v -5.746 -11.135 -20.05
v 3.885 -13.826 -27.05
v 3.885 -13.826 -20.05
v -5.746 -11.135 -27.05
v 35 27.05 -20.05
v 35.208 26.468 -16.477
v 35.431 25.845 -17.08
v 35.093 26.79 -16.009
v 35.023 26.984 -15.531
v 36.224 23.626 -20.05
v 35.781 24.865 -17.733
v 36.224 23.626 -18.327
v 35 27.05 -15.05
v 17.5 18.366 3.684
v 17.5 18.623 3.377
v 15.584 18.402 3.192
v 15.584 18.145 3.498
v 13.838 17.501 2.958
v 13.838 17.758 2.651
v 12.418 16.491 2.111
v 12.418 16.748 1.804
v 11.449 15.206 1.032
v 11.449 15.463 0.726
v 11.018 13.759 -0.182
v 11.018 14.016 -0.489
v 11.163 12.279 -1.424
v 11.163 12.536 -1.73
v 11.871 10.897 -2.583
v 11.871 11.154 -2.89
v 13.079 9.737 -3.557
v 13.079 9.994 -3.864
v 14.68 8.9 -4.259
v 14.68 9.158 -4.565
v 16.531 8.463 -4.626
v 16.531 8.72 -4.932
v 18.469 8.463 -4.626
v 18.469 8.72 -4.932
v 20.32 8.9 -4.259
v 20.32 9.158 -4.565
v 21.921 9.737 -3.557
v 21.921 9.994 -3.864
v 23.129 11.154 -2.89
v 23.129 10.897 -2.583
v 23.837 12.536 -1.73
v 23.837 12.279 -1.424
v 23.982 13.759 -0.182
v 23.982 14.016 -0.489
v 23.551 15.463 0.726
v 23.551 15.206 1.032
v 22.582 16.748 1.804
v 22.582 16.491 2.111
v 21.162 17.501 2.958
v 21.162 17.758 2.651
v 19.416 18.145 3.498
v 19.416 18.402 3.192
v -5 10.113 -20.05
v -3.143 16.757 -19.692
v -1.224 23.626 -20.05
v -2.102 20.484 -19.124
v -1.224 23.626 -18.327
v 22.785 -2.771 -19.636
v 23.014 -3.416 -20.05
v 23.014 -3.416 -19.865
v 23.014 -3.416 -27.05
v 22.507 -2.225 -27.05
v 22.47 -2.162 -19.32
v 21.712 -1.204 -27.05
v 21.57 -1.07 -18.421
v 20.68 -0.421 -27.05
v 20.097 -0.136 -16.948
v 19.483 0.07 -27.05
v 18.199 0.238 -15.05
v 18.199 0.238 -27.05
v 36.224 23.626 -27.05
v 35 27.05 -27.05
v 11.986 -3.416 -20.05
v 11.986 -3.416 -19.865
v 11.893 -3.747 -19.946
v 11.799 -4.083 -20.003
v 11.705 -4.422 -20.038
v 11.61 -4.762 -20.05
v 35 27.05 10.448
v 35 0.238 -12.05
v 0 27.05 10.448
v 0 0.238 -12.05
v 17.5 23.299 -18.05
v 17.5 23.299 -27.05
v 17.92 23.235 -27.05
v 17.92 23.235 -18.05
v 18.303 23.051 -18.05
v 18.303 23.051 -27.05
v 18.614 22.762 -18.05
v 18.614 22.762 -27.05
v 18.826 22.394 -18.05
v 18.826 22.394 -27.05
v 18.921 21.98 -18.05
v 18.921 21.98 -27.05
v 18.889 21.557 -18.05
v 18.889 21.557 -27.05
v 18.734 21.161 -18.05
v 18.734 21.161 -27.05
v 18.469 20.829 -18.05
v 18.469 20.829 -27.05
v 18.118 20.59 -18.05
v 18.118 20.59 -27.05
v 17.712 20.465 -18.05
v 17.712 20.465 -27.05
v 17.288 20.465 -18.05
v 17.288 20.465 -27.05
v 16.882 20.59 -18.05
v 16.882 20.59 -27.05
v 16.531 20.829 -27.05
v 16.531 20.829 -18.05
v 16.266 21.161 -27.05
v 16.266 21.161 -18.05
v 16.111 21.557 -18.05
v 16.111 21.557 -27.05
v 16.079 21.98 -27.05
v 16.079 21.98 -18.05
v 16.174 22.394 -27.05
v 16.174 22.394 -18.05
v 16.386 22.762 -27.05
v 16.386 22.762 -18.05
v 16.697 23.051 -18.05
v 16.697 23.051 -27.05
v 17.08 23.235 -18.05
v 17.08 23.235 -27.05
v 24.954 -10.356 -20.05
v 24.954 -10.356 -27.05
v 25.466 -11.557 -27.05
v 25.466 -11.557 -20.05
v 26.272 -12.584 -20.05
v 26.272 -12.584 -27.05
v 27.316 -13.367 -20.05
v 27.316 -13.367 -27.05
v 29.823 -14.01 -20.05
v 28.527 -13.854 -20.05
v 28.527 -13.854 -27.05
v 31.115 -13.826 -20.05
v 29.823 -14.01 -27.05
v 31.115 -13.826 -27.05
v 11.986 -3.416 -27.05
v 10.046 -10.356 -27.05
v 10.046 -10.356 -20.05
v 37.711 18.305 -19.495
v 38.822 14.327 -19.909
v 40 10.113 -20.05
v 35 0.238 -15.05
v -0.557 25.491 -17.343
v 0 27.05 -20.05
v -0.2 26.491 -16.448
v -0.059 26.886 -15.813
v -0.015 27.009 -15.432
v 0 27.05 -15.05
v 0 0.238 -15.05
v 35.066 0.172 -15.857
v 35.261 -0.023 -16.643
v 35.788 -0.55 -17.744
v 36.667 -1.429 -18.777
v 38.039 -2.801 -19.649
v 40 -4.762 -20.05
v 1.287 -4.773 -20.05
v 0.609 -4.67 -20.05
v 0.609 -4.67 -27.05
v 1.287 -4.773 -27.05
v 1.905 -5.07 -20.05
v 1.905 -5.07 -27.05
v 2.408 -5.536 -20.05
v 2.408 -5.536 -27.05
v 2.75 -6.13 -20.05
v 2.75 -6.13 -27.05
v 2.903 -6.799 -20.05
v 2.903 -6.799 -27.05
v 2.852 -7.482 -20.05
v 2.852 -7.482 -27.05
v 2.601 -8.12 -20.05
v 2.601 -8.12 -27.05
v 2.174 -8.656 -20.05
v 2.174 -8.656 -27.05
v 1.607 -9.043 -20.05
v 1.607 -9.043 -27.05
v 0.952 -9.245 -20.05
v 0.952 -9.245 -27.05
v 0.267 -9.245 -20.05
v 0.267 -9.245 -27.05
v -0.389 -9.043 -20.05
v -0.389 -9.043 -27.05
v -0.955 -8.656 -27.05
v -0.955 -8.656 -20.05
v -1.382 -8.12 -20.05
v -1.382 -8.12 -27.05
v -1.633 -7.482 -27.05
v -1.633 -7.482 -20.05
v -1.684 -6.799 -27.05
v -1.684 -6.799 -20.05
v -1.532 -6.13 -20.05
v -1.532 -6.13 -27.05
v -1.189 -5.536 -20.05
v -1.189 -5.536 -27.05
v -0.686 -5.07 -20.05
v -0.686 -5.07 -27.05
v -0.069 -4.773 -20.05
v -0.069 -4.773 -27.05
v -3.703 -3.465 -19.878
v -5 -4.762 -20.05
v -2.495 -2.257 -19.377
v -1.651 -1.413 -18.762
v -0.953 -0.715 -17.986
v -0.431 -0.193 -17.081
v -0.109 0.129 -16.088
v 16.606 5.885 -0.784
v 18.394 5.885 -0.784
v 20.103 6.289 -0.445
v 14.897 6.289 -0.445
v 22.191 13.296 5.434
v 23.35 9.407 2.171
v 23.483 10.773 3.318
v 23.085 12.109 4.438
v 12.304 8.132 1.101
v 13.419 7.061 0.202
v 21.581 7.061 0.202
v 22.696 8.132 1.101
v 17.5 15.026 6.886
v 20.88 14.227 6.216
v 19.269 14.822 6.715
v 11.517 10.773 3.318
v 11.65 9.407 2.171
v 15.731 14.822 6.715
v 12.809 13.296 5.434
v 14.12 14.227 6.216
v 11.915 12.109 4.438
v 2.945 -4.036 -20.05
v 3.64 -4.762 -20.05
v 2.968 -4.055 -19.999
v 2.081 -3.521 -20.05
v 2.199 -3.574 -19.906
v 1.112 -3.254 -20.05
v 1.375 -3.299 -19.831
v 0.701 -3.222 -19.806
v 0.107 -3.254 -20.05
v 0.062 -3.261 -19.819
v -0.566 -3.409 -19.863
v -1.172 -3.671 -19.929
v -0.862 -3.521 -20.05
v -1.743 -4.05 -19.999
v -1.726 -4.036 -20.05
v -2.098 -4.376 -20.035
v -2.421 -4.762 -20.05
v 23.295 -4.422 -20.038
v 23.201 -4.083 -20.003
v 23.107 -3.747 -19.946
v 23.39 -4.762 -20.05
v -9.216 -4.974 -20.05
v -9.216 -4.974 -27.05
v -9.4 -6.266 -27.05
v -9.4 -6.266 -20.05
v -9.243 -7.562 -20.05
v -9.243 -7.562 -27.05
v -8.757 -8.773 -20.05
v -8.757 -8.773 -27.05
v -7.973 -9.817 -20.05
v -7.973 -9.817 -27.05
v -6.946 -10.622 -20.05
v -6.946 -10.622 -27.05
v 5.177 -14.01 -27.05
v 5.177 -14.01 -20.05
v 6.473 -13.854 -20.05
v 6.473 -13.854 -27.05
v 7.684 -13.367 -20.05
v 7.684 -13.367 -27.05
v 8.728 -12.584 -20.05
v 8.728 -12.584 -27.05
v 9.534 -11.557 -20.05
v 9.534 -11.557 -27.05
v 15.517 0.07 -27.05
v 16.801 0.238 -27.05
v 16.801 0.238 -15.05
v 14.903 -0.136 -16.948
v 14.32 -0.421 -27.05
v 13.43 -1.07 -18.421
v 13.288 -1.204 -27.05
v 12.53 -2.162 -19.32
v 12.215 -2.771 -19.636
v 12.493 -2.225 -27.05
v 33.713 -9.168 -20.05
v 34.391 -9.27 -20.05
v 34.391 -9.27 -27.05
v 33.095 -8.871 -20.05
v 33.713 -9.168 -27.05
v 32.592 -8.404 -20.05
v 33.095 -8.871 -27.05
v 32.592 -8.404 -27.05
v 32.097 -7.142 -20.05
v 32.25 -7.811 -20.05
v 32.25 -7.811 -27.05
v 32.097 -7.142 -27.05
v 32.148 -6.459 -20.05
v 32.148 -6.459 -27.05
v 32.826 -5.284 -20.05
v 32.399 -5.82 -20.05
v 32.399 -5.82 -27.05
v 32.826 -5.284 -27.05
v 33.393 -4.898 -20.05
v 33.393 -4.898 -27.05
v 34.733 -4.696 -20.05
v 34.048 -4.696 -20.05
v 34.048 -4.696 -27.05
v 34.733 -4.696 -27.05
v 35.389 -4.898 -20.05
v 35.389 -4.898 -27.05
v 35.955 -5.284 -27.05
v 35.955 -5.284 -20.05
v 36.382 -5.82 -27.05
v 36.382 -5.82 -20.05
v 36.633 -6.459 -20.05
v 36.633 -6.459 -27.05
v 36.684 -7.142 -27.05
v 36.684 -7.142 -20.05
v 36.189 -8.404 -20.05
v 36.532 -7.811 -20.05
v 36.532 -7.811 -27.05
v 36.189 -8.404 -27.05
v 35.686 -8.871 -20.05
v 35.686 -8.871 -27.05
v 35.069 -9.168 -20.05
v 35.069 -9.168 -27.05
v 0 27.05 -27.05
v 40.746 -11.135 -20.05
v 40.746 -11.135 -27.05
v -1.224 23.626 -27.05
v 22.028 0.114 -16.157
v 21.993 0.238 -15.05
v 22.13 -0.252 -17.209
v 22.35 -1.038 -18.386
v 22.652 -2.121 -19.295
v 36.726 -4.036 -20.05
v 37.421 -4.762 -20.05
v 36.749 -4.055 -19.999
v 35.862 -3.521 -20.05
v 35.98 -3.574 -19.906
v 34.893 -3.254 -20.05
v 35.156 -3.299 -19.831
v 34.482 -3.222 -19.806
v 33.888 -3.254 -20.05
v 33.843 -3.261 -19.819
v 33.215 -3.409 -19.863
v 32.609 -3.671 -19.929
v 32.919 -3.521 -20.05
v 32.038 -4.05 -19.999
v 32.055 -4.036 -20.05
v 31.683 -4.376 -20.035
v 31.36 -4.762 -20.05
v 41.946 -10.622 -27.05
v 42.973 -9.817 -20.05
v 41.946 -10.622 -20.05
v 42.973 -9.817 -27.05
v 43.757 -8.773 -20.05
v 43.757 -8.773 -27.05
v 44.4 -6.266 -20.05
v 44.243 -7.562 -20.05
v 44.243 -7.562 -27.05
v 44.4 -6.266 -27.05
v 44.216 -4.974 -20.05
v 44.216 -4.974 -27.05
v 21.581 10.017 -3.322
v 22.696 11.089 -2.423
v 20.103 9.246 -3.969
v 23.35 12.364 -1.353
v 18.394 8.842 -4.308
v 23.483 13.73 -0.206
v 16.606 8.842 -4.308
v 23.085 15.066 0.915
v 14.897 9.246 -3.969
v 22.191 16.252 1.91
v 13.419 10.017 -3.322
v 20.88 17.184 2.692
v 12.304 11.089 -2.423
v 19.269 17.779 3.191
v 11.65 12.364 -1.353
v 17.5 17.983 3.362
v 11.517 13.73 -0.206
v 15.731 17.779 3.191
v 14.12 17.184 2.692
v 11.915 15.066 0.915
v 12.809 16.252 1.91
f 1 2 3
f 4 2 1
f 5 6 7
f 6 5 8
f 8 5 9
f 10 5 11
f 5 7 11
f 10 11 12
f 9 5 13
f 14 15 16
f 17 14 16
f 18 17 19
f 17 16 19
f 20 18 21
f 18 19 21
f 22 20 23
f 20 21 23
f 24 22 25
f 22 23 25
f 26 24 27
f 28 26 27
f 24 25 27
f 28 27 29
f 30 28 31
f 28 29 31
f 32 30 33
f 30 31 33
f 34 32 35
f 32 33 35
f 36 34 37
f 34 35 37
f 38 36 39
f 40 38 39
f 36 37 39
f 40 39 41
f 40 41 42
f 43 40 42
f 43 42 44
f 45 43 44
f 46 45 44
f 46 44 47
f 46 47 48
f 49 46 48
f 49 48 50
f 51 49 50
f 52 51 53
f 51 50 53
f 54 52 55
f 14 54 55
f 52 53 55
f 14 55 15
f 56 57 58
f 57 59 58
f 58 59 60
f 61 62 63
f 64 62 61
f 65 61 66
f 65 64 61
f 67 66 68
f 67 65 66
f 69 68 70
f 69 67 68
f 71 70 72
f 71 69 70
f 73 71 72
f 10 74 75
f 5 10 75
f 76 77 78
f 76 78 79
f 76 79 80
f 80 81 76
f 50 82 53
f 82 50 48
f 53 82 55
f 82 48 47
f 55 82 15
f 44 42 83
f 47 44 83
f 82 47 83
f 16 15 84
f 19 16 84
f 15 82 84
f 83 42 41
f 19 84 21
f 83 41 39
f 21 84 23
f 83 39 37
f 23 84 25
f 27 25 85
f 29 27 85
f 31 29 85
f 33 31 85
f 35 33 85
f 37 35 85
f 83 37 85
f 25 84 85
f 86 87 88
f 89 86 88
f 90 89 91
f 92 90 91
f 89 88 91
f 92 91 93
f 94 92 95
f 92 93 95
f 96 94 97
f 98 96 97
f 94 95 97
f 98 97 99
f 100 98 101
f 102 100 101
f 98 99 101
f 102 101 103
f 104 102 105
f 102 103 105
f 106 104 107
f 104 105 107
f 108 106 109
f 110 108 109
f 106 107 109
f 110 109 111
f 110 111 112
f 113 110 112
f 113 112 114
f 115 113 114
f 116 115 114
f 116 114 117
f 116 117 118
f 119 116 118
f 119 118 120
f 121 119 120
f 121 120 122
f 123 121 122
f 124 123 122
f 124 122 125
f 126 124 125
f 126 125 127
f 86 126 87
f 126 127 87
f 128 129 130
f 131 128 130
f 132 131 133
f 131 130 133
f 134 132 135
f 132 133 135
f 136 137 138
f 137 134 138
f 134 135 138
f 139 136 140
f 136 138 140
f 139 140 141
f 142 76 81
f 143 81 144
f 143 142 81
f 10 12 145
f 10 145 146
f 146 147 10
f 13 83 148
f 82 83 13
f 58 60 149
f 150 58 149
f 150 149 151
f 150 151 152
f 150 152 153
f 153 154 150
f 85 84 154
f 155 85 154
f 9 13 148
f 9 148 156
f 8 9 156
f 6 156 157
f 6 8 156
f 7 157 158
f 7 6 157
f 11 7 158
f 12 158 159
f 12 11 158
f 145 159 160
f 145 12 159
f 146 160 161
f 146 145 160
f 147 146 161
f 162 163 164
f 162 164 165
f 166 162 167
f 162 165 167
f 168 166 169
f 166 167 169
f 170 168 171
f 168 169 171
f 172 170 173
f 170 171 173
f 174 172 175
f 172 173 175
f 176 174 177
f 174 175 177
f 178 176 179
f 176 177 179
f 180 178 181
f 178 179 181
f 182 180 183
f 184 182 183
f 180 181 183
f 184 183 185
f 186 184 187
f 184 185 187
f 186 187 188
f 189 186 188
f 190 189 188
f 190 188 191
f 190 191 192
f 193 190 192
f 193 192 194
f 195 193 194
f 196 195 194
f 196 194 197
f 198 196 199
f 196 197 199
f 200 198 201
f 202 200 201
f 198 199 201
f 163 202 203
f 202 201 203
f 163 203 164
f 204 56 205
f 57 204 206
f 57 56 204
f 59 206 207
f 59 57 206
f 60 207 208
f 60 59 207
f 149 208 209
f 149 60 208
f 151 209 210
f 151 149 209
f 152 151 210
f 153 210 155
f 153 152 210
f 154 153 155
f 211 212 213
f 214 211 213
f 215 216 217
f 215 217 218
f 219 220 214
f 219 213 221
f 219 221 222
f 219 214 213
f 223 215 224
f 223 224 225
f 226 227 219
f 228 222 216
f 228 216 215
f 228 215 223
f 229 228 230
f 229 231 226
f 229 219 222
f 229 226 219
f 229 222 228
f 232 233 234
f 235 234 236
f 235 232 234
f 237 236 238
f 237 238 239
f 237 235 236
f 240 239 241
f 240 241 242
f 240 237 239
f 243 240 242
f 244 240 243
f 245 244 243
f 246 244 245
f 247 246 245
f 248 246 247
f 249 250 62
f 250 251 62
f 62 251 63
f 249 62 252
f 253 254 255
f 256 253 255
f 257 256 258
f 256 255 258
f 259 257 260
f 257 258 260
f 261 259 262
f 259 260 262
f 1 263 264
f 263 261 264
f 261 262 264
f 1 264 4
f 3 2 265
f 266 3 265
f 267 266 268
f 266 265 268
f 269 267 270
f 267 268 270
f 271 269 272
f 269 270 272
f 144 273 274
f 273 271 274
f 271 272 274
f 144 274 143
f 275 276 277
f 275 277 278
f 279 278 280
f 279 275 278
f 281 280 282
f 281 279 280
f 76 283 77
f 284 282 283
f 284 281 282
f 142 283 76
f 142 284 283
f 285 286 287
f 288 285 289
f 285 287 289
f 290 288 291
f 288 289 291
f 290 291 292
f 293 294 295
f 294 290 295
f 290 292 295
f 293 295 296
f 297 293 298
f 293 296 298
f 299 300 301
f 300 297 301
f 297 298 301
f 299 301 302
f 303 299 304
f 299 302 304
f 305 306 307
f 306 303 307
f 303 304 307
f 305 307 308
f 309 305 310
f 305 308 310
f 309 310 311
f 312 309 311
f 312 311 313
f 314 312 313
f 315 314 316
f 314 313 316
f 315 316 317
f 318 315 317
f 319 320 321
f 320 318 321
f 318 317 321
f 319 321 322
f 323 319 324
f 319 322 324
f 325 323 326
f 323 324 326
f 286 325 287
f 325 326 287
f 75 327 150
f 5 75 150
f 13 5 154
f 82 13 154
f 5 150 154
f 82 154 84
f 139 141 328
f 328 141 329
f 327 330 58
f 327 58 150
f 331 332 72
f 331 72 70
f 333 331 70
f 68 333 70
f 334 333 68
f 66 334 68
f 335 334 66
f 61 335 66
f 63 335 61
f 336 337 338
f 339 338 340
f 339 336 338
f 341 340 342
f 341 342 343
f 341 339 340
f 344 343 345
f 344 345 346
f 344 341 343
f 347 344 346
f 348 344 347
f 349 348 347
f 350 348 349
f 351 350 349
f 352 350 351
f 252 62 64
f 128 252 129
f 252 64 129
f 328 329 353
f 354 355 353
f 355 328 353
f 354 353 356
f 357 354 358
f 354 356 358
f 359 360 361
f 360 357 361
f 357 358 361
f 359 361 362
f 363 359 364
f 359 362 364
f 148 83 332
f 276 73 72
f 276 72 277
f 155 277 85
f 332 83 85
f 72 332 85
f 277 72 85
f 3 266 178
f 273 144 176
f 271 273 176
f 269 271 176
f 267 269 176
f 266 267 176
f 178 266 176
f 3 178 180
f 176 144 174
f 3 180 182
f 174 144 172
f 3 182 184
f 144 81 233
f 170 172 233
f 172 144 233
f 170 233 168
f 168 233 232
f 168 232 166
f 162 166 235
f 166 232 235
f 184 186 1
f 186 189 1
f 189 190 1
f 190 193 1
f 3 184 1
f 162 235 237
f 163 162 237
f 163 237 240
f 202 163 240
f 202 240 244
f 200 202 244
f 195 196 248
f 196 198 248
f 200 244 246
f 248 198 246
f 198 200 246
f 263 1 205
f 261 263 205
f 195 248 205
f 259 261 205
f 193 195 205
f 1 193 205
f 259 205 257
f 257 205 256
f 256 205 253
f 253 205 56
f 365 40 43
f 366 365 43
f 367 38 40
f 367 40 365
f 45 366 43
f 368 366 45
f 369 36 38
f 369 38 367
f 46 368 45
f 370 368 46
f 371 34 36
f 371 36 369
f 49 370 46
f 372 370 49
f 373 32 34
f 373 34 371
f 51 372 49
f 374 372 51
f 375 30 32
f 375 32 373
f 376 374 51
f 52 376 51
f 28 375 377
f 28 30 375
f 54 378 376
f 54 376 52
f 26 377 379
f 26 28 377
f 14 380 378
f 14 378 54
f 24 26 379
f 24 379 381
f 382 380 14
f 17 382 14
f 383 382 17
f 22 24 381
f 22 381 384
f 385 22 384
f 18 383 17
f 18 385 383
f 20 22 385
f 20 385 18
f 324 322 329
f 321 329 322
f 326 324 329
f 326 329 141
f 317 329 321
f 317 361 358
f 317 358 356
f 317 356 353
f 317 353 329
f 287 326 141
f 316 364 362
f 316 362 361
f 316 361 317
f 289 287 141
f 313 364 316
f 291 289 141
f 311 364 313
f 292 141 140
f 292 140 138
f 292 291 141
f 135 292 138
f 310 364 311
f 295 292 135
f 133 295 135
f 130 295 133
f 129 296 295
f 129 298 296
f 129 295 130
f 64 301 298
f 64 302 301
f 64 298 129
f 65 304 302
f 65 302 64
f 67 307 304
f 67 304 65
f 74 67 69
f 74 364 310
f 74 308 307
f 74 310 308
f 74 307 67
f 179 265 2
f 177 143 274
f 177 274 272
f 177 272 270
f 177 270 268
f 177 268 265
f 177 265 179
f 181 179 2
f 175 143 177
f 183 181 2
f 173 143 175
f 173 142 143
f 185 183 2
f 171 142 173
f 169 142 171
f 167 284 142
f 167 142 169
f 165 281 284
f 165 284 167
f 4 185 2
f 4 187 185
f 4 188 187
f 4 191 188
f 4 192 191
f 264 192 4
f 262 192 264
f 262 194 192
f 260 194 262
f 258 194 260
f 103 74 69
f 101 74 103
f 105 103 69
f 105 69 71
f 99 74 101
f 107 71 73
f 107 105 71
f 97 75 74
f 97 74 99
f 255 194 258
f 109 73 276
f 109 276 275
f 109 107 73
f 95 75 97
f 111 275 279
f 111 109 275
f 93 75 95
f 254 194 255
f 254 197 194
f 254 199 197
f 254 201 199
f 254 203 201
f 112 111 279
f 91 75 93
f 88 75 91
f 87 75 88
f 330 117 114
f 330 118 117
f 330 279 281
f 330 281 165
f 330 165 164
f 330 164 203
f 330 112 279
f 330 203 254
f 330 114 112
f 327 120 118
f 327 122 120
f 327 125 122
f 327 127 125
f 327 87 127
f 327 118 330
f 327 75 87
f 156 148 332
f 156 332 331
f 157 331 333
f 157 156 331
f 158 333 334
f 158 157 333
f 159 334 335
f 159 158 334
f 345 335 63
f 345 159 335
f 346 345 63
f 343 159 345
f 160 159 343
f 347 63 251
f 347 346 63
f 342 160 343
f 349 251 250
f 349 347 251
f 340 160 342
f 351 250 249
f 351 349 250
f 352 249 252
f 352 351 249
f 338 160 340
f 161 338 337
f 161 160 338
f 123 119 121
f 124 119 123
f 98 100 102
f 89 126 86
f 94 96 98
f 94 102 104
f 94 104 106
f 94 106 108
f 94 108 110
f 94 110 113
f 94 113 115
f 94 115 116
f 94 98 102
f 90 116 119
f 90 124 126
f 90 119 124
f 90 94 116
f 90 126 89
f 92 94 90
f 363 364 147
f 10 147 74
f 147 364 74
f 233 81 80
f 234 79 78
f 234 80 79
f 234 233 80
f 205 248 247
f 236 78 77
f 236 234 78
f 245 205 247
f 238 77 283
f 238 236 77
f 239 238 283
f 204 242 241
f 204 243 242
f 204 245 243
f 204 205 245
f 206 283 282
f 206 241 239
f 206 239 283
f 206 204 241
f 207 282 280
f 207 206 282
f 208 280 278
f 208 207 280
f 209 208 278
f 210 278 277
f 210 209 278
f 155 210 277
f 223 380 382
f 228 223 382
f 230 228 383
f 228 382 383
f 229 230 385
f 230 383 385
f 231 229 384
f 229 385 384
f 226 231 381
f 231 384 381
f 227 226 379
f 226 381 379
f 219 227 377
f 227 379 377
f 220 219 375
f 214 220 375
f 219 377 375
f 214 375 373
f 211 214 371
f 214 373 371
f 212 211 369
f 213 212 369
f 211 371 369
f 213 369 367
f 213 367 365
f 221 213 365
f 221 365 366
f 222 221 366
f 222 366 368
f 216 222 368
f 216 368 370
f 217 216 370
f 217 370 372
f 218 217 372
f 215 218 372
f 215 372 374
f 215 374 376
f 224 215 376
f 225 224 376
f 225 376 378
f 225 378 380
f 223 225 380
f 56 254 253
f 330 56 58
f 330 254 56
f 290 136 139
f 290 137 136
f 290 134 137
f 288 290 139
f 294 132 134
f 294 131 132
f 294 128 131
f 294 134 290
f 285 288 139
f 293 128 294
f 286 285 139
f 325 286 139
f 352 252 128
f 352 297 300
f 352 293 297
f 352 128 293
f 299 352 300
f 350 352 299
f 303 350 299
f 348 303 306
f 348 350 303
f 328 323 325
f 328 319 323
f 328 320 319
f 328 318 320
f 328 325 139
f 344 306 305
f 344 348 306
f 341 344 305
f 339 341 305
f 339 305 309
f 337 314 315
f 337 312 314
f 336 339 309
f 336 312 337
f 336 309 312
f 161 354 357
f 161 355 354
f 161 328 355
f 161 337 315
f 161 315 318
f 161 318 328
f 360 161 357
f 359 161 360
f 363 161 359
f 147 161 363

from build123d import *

# Parameters (mm, degrees)
AUFSATZ_LINEAR_AUSTRAGEN1_DEPTH    = 35
SKIZZE3_R                          = 6
AUFSATZ_LINEAR_AUSTRAGEN2_DEPTH    = 5
SKIZZE4_R                          = 6.5
AUFSATZ_LINEAR_AUSTRAGEN3_DEPTH    = 0.4
K_RPER_VERSCHIEBEN_KOPIEREN1_ANGLE = 90
SKIZZE9_R                          = 2.3
AUFSATZ_LINEAR_AUSTRAGEN4_DEPTH    = 7
VERRUNDUNG1_R                      = 5
SKIZZE11_R                         = 3.75
SCHNITT_LINEAR_AUSTRAGEN2_DEPTH    = 10
SKIZZE12_R                         = 1.425000005
SCHNITT_LINEAR_AUSTRAGEN3_DEPTH    = 9


with BuildPart() as part:
    # Skizze1 → Aufsatz-Linear austragen1 (new body)
    with BuildSketch(Plane(origin=(0, 0, 0), x_dir=(0, 0, -1), z_dir=(1, 0, 0))):
        Polygon((0, 0), (26.811555509, 0), (26.811555509, 37.497566339), (0, 15), align=None)
    extrude(amount=AUFSATZ_LINEAR_AUSTRAGEN1_DEPTH)

    # Skizze3 → Aufsatz-Linear austragen2 (add)
    with BuildSketch(Plane(origin=(0, 8.802361333, 7.386058148), x_dir=(1, 0, 0), z_dir=(0, 0.7660444431189768, 0.642787609686541))):
        with Locations(Location((17.5, 27.141814145, 0), (0, 0, 90))):
            Circle(SKIZZE3_R)
    extrude(amount=AUFSATZ_LINEAR_AUSTRAGEN2_DEPTH)

    # Skizze4 → Aufsatz-Linear austragen3 (add)
    with BuildSketch(Plane(origin=(0, 8.802361333, 7.386058148), x_dir=(1, 0, 0), z_dir=(0, 0.7660444431189767, 0.6427876096865409))):
        with Locations(Location((17.5, 27.141814145, 0), (0, 0, 90))):
            Circle(SKIZZE4_R)
    extrude(amount=AUFSATZ_LINEAR_AUSTRAGEN3_DEPTH)


with BuildPart() as part_1:
    # Körper-Verschieben/Kopieren1: moved
    add(part.part.rotate(Axis((0, 13.64378317, -13.405777755), (1, 0, 0)), K_RPER_VERSCHIEBEN_KOPIEREN1_ANGLE))

    # Skizze9 → Aufsatz-Linear austragen4 (add)
    # profile 1 of 2: a face of its own
    with BuildSketch(Plane(origin=(0, 0, -27.049560924), x_dir=(-1, 0, 0), z_dir=(0, 0, -1))):
        Polygon((-13.006801175, 0.238005415), (-8.700779715, -15.171672686), (10.561317912, -9.789145862), (1.223844944, 23.626259531), (0, 27.049560924), (0, 0.238005415), align=None)
        with Locations(Location((-0.609417277, -6.970434083, 0), (0, 0, 90))):
            Circle(SKIZZE9_R, mode=Mode.SUBTRACT)
    # profile 2 of 2: a face of its own
    with BuildSketch(Plane(origin=(0, 0, -27.049560924), x_dir=(-1, 0, 0), z_dir=(0, 0, -1))):
        Polygon((-45.561317912, -9.789145862), (-36.223844944, 23.626259531), (-35, 27.049560924), (-35, 0.238005415), (-21.993198825, 0.238005415), (-26.299220285, -15.171672686), align=None)
        with Locations(Location((-34.390582723, -6.970434083, 0), (0, 0, 270))):
            Circle(SKIZZE9_R, mode=Mode.SUBTRACT)
    extrude(amount=-AUFSATZ_LINEAR_AUSTRAGEN4_DEPTH)

    # Verrundung1
    # the kernel refuses this fillet: 5 mm, written as the material it adds along each edge
    with BuildSketch(Plane(origin=(35, 27.049560924, -20.049560924), x_dir=(1, 0, 0), z_dir=(0, -1, 0))) as verrundung1_piece_1_section:
        with BuildLine():
            CenterArc((VERRUNDUNG1_R, VERRUNDUNG1_R), VERRUNDUNG1_R, 180, 90)
            Line((0, VERRUNDUNG1_R), (-VERRUNDUNG1_R * 0.02, VERRUNDUNG1_R))
            Line((-VERRUNDUNG1_R * 0.02, VERRUNDUNG1_R), (-VERRUNDUNG1_R * 0.02, -VERRUNDUNG1_R * 0.02))
            Line((-VERRUNDUNG1_R * 0.02, -VERRUNDUNG1_R * 0.02), (VERRUNDUNG1_R, -VERRUNDUNG1_R * 0.02))
            Line((VERRUNDUNG1_R, -VERRUNDUNG1_R * 0.02), (VERRUNDUNG1_R, 0))
        make_face()
    verrundung1_piece_1 = extrude(amount=26.811555509, mode=Mode.PRIVATE)
    verrundung1_piece_1 = split(verrundung1_piece_1, bisect_by=Plane(origin=(39.17481741, 13.065806869, -18.82374956), z_dir=(-0.9631048813334838, -0.2691263412444353, -1.6244750072279728e-13)), keep=Keep.TOP, mode=Mode.PRIVATE)
    verrundung1_piece_1 = split(verrundung1_piece_1, bisect_by=Plane(origin=(39.826476164, 13.549090416, -18.82374956), z_dir=(-0.9416340631335743, -0.3366382199729496, -2.0319838344143382e-13)), keep=Keep.TOP, mode=Mode.PRIVATE)
    add(verrundung1_piece_1)
    with BuildSketch(Plane(origin=(35, 0.238005415, -20.049560924), x_dir=(0, 0, 1), z_dir=(-1, 0, 0))) as verrundung1_piece_2_section:
        with BuildLine():
            CenterArc((VERRUNDUNG1_R, -VERRUNDUNG1_R), VERRUNDUNG1_R, 90, 90)
            Line((0, -VERRUNDUNG1_R), (-VERRUNDUNG1_R * 0.02, -VERRUNDUNG1_R))
            Line((-VERRUNDUNG1_R * 0.02, -VERRUNDUNG1_R), (-VERRUNDUNG1_R * 0.02, VERRUNDUNG1_R * 0.02))
            Line((-VERRUNDUNG1_R * 0.02, VERRUNDUNG1_R * 0.02), (VERRUNDUNG1_R, VERRUNDUNG1_R * 0.02))
            Line((VERRUNDUNG1_R, VERRUNDUNG1_R * 0.02), (VERRUNDUNG1_R, 0))
        make_face()
    verrundung1_piece_2 = extrude(amount=25.506801175, mode=Mode.PRIVATE)
    verrundung1_piece_2 = split(verrundung1_piece_2, bisect_by=Plane(origin=(22.762065147, -2.513486336, -18.902354356), z_dir=(0.9631048813334842, 0.2691263412444339, 1.6244750072279647e-13)), keep=Keep.TOP, mode=Mode.PRIVATE)
    verrundung1_piece_2 = verrundung1_piece_2 - Plane(origin=(34.390582723, -6.970434083, -18.902354356), x_dir=(0, -1, 0), z_dir=(0, 0, -1)) * Cylinder(2.3, 72, mode=Mode.PRIVATE)
    add(verrundung1_piece_2)
    with BuildSketch(Plane(origin=(35, 0.238005415, -20.049560924), x_dir=(0, 0, 1), z_dir=(-1, 0, 0))) as verrundung1_piece_3_section:
        with BuildLine():
            CenterArc((VERRUNDUNG1_R, -VERRUNDUNG1_R), VERRUNDUNG1_R, 90, 90)
            Line((0, -VERRUNDUNG1_R), (-VERRUNDUNG1_R * 0.02, -VERRUNDUNG1_R))
            Line((-VERRUNDUNG1_R * 0.02, -VERRUNDUNG1_R), (-VERRUNDUNG1_R * 0.02, VERRUNDUNG1_R * 0.02))
            Line((-VERRUNDUNG1_R * 0.02, VERRUNDUNG1_R * 0.02), (VERRUNDUNG1_R, VERRUNDUNG1_R * 0.02))
            Line((VERRUNDUNG1_R, VERRUNDUNG1_R * 0.02), (VERRUNDUNG1_R, 0))
        make_face()
    verrundung1_piece_3 = extrude(amount=25.506801175, mode=Mode.PRIVATE)
    verrundung1_piece_3 = split(verrundung1_piece_3, bisect_by=Plane(origin=(12.602046932, -1.210462189, -18.857593889), z_dir=(-0.9631048813334842, 0.26912634124443413, 1.6244750072279654e-13)), keep=Keep.TOP, mode=Mode.PRIVATE)
    add(verrundung1_piece_3)
    with BuildSketch(Plane(origin=(0, 0.238005415, -20.049560924), x_dir=(0, 0, 1), z_dir=(1, 0, 0))) as verrundung1_piece_4_section:
        with BuildLine():
            CenterArc((VERRUNDUNG1_R, VERRUNDUNG1_R), VERRUNDUNG1_R, 180, 90)
            Line((0, VERRUNDUNG1_R), (-VERRUNDUNG1_R * 0.02, VERRUNDUNG1_R))
            Line((-VERRUNDUNG1_R * 0.02, VERRUNDUNG1_R), (-VERRUNDUNG1_R * 0.02, -VERRUNDUNG1_R * 0.02))
            Line((-VERRUNDUNG1_R * 0.02, -VERRUNDUNG1_R * 0.02), (VERRUNDUNG1_R, -VERRUNDUNG1_R * 0.02))
            Line((VERRUNDUNG1_R, -VERRUNDUNG1_R * 0.02), (VERRUNDUNG1_R, 0))
        make_face()
    verrundung1_piece_4 = extrude(amount=25.506801175, mode=Mode.PRIVATE)
    verrundung1_piece_4 = split(verrundung1_piece_4, bisect_by=Plane(origin=(12.237934855, -2.513486327, -18.902354361), z_dir=(-0.9631048813334842, 0.26912634124443413, 1.6244750072279654e-13)), keep=Keep.TOP, mode=Mode.PRIVATE)
    verrundung1_piece_4 = verrundung1_piece_4 - Plane(origin=(0.609417277, -6.970434083, -18.902354361), x_dir=(0, 1, 0), z_dir=(0, 0, -1)) * Cylinder(2.3, 72, mode=Mode.PRIVATE)
    add(verrundung1_piece_4)
    with BuildSketch(Plane(origin=(0, 0.238005415, -20.049560924), x_dir=(0, 0, 1), z_dir=(1, 0, 0))) as verrundung1_piece_5_section:
        with BuildLine():
            CenterArc((VERRUNDUNG1_R, VERRUNDUNG1_R), VERRUNDUNG1_R, 180, 90)
            Line((0, VERRUNDUNG1_R), (-VERRUNDUNG1_R * 0.02, VERRUNDUNG1_R))
            Line((-VERRUNDUNG1_R * 0.02, VERRUNDUNG1_R), (-VERRUNDUNG1_R * 0.02, -VERRUNDUNG1_R * 0.02))
            Line((-VERRUNDUNG1_R * 0.02, -VERRUNDUNG1_R * 0.02), (VERRUNDUNG1_R, -VERRUNDUNG1_R * 0.02))
            Line((VERRUNDUNG1_R, -VERRUNDUNG1_R * 0.02), (VERRUNDUNG1_R, 0))
        make_face()
    verrundung1_piece_5 = extrude(amount=25.506801175, mode=Mode.PRIVATE)
    verrundung1_piece_5 = split(verrundung1_piece_5, bisect_by=Plane(origin=(22.397953068, -1.210462189, -18.857593889), z_dir=(0.9631048813334842, 0.2691263412444339, 1.6244750072279647e-13)), keep=Keep.TOP, mode=Mode.PRIVATE)
    add(verrundung1_piece_5)
    with BuildSketch(Plane(origin=(0, 27.049560924, -20.049560924), x_dir=(0, 0, 1), z_dir=(0, -1, 0))) as verrundung1_piece_6_section:
        with BuildLine():
            CenterArc((VERRUNDUNG1_R, VERRUNDUNG1_R), VERRUNDUNG1_R, 180, 90)
            Line((0, VERRUNDUNG1_R), (-VERRUNDUNG1_R * 0.02, VERRUNDUNG1_R))
            Line((-VERRUNDUNG1_R * 0.02, VERRUNDUNG1_R), (-VERRUNDUNG1_R * 0.02, -VERRUNDUNG1_R * 0.02))
            Line((-VERRUNDUNG1_R * 0.02, -VERRUNDUNG1_R * 0.02), (VERRUNDUNG1_R, -VERRUNDUNG1_R * 0.02))
            Line((VERRUNDUNG1_R, -VERRUNDUNG1_R * 0.02), (VERRUNDUNG1_R, 0))
        make_face()
    verrundung1_piece_6 = extrude(amount=26.811555509, mode=Mode.PRIVATE)
    verrundung1_piece_6 = split(verrundung1_piece_6, bisect_by=Plane(origin=(-4.17481741, 13.06580687, -18.82374956), z_dir=(0.9631048813334837, -0.26912634124443535, -1.6244750072279728e-13)), keep=Keep.TOP, mode=Mode.PRIVATE)
    verrundung1_piece_6 = split(verrundung1_piece_6, bisect_by=Plane(origin=(-4.826476163, 13.549090417, -18.82374956), z_dir=(0.9416340631335748, -0.3366382199729482, -2.0319838344143293e-13)), keep=Keep.TOP, mode=Mode.PRIVATE)
    add(verrundung1_piece_6)
    with BuildSketch(Plane(origin=(21.993198825, 0.238005415, -27.049560924), x_dir=(-1, 0, 0), z_dir=(0, 0, 1))) as verrundung1_piece_7:
        with BuildLine():
            CenterArc((VERRUNDUNG1_R * 0.758872343938, VERRUNDUNG1_R), VERRUNDUNG1_R, 195.612285688, 74.387714312)
            Line((-VERRUNDUNG1_R * 0.204232537396, VERRUNDUNG1_R * 0.730873658756), (-VERRUNDUNG1_R * 0.223494635022, VERRUNDUNG1_R * 0.725491131931))
            Line((-VERRUNDUNG1_R * 0.223494635022, VERRUNDUNG1_R * 0.725491131931), (-VERRUNDUNG1_R * 0.0151774468788, -VERRUNDUNG1_R * 0.02))
            Line((-VERRUNDUNG1_R * 0.0151774468788, -VERRUNDUNG1_R * 0.02), (VERRUNDUNG1_R * 0.758872343938, -VERRUNDUNG1_R * 0.02))
            Line((VERRUNDUNG1_R * 0.758872343938, -VERRUNDUNG1_R * 0.02), (VERRUNDUNG1_R * 0.758872343938, 0))
        make_face()
    extrude(amount=7)
    with BuildSketch(Plane(origin=(13.006801175, 0.238005415, -27.049560924), x_dir=(1, 0, 0), z_dir=(0, 0, 1))) as verrundung1_piece_8:
        with BuildLine():
            CenterArc((VERRUNDUNG1_R * 0.758872343938, -VERRUNDUNG1_R), VERRUNDUNG1_R, 90, 74.387714312)
            Line((-VERRUNDUNG1_R * 0.204232537396, -VERRUNDUNG1_R * 0.730873658756), (-VERRUNDUNG1_R * 0.223494635022, -VERRUNDUNG1_R * 0.725491131931))
            Line((-VERRUNDUNG1_R * 0.223494635022, -VERRUNDUNG1_R * 0.725491131931), (-VERRUNDUNG1_R * 0.0151774468788, VERRUNDUNG1_R * 0.02))
            Line((-VERRUNDUNG1_R * 0.0151774468788, VERRUNDUNG1_R * 0.02), (VERRUNDUNG1_R * 0.758872343938, VERRUNDUNG1_R * 0.02))
            Line((VERRUNDUNG1_R * 0.758872343938, VERRUNDUNG1_R * 0.02), (VERRUNDUNG1_R * 0.758872343938, 0))
        make_face()
    extrude(amount=7)
    with BuildSketch(Plane(origin=(47.5, 0.238005415, -20.049560924), x_dir=(0, 0, 1), z_dir=(-1, 0, 0))) as verrundung1_piece_9a_section:
        with BuildLine():
            CenterArc((VERRUNDUNG1_R, -VERRUNDUNG1_R), VERRUNDUNG1_R, 90, 90)
            Line((0, -VERRUNDUNG1_R), (-VERRUNDUNG1_R * 0.02, -VERRUNDUNG1_R))
            Line((-VERRUNDUNG1_R * 0.02, -VERRUNDUNG1_R), (-VERRUNDUNG1_R * 0.02, VERRUNDUNG1_R * 0.02))
            Line((-VERRUNDUNG1_R * 0.02, VERRUNDUNG1_R * 0.02), (VERRUNDUNG1_R, VERRUNDUNG1_R * 0.02))
            Line((VERRUNDUNG1_R, VERRUNDUNG1_R * 0.02), (VERRUNDUNG1_R, 0))
        make_face()
    verrundung1_piece_9a = extrude(amount=38.006801175, mode=Mode.PRIVATE)
    verrundung1_piece_9a = split(verrundung1_piece_9a, bisect_by=Plane(origin=(35, -0.934173805, -18.941336544), z_dir=(1, 0, 0)), keep=Keep.TOP, mode=Mode.PRIVATE)
    verrundung1_piece_9a = split(verrundung1_piece_9a, bisect_by=Plane(origin=(42.794054861, 0.1138779, -18.941336544), z_dir=(-0.9631048813334838, -0.2691263412444353, -1.6244750072279728e-13)), keep=Keep.TOP, mode=Mode.PRIVATE)
    with BuildSketch(Plane(origin=(35, 27.049560924, -20.049560924), x_dir=(1, 0, 0), z_dir=(0, -1, 0))) as verrundung1_piece_9b_section:
        with BuildLine():
            CenterArc((VERRUNDUNG1_R, VERRUNDUNG1_R), VERRUNDUNG1_R, 180, 90)
            Line((0, VERRUNDUNG1_R), (-VERRUNDUNG1_R * 0.02, VERRUNDUNG1_R))
            Line((-VERRUNDUNG1_R * 0.02, VERRUNDUNG1_R), (-VERRUNDUNG1_R * 0.02, -VERRUNDUNG1_R * 0.02))
            Line((-VERRUNDUNG1_R * 0.02, -VERRUNDUNG1_R * 0.02), (VERRUNDUNG1_R, -VERRUNDUNG1_R * 0.02))
            Line((VERRUNDUNG1_R, -VERRUNDUNG1_R * 0.02), (VERRUNDUNG1_R, 0))
        make_face()
    verrundung1_piece_9b = extrude(amount=39.311555509, mode=Mode.PRIVATE)
    verrundung1_piece_9b = split(verrundung1_piece_9b, bisect_by=Plane(origin=(38.695669586, 0.238005415, -19.917388299), z_dir=(0, -1, 0)), keep=Keep.TOP, mode=Mode.PRIVATE)
    verrundung1_piece_9b = split(verrundung1_piece_9b, bisect_by=Plane(origin=(39.091980364, -11.596912781, -19.917388299), z_dir=(-0.2691263412444344, 0.963104881333484, 5.813402738026697e-13)), keep=Keep.TOP, mode=Mode.PRIVATE)
    verrundung1_piece_9b = verrundung1_piece_9b - Plane(origin=(34.390582723, -6.970434083, -19.917388299), x_dir=(0, -1, 0), z_dir=(0, 0, -1)) * Cylinder(2.3, 99, mode=Mode.PRIVATE)
    verrundung1_piece_9 = verrundung1_piece_9a & verrundung1_piece_9b
    add(verrundung1_piece_9)
    with BuildSketch(Plane(origin=(21.993198825, 0.238005415, -27.049560924), x_dir=(-1, 0, 0), z_dir=(0, 0, 1))) as verrundung1_piece_10a_section:
        with BuildLine():
            CenterArc((VERRUNDUNG1_R * 0.758872343938, VERRUNDUNG1_R), VERRUNDUNG1_R, 195.612285688, 74.387714312)
            Line((-VERRUNDUNG1_R * 0.204232537396, VERRUNDUNG1_R * 0.730873658756), (-VERRUNDUNG1_R * 0.223494635022, VERRUNDUNG1_R * 0.725491131931))
            Line((-VERRUNDUNG1_R * 0.223494635022, VERRUNDUNG1_R * 0.725491131931), (-VERRUNDUNG1_R * 0.0151774468788, -VERRUNDUNG1_R * 0.02))
            Line((-VERRUNDUNG1_R * 0.0151774468788, -VERRUNDUNG1_R * 0.02), (VERRUNDUNG1_R * 0.758872343938, -VERRUNDUNG1_R * 0.02))
            Line((VERRUNDUNG1_R * 0.758872343938, -VERRUNDUNG1_R * 0.02), (VERRUNDUNG1_R * 0.758872343938, 0))
        make_face()
    verrundung1_piece_10a = extrude(amount=16.485904299, mode=Mode.PRIVATE)
    verrundung1_piece_10a = split(verrundung1_piece_10a, bisect_by=Plane(origin=(21.313503925, -2.310633004, -14.188122481), z_dir=(0, 0.6427876096870035, -0.7660444431185887)), keep=Keep.TOP, mode=Mode.PRIVATE)
    verrundung1_piece_10a = split(verrundung1_piece_10a, bisect_by=Plane(origin=(21.313503925, -0.491782993, -20.049560924), z_dir=(0, 0, 1)), keep=Keep.TOP, mode=Mode.PRIVATE)
    with BuildSketch(Plane(origin=(35, 0.238005415, -20.049560924), x_dir=(0, 0, 1), z_dir=(-1, 0, 0))) as verrundung1_piece_10b_section:
        with BuildLine():
            CenterArc((VERRUNDUNG1_R, -VERRUNDUNG1_R), VERRUNDUNG1_R, 90, 90)
            Line((0, -VERRUNDUNG1_R), (-VERRUNDUNG1_R * 0.02, -VERRUNDUNG1_R))
            Line((-VERRUNDUNG1_R * 0.02, -VERRUNDUNG1_R), (-VERRUNDUNG1_R * 0.02, VERRUNDUNG1_R * 0.02))
            Line((-VERRUNDUNG1_R * 0.02, VERRUNDUNG1_R * 0.02), (VERRUNDUNG1_R, VERRUNDUNG1_R * 0.02))
            Line((VERRUNDUNG1_R, VERRUNDUNG1_R * 0.02), (VERRUNDUNG1_R, 0))
        make_face()
    verrundung1_piece_10b = extrude(amount=25.506801175, mode=Mode.PRIVATE)
    verrundung1_piece_10b = split(verrundung1_piece_10b, bisect_by=Plane(origin=(13.021336565, 0.290022269, -18.957466714), z_dir=(0.9631048813334842, -0.26912634124443413, -1.6244750072279654e-13)), keep=Keep.TOP, mode=Mode.PRIVATE)
    verrundung1_piece_10b = split(verrundung1_piece_10b, bisect_by=Plane(origin=(21.978663435, 0.290022269, -18.957466714), z_dir=(-0.9631048813334842, -0.2691263412444339, -1.6244750072279647e-13)), keep=Keep.TOP, mode=Mode.PRIVATE)
    verrundung1_piece_10 = verrundung1_piece_10a & verrundung1_piece_10b
    add(verrundung1_piece_10)
    with BuildSketch(Plane(origin=(-12.5, 0.238005415, -20.049560924), x_dir=(0, 0, 1), z_dir=(1, 0, 0))) as verrundung1_piece_11a_section:
        with BuildLine():
            CenterArc((VERRUNDUNG1_R, VERRUNDUNG1_R), VERRUNDUNG1_R, 180, 90)
            Line((0, VERRUNDUNG1_R), (-VERRUNDUNG1_R * 0.02, VERRUNDUNG1_R))
            Line((-VERRUNDUNG1_R * 0.02, VERRUNDUNG1_R), (-VERRUNDUNG1_R * 0.02, -VERRUNDUNG1_R * 0.02))
            Line((-VERRUNDUNG1_R * 0.02, -VERRUNDUNG1_R * 0.02), (VERRUNDUNG1_R, -VERRUNDUNG1_R * 0.02))
            Line((VERRUNDUNG1_R, -VERRUNDUNG1_R * 0.02), (VERRUNDUNG1_R, 0))
        make_face()
    verrundung1_piece_11a = extrude(amount=38.006801175, mode=Mode.PRIVATE)
    verrundung1_piece_11a = split(verrundung1_piece_11a, bisect_by=Plane(origin=(0, -0.934173805, -18.941336544), z_dir=(-1, 0, 0)), keep=Keep.TOP, mode=Mode.PRIVATE)
    verrundung1_piece_11a = split(verrundung1_piece_11a, bisect_by=Plane(origin=(-7.794054861, 0.1138779, -18.941336544), z_dir=(0.9631048813334837, -0.26912634124443535, -1.6244750072279728e-13)), keep=Keep.TOP, mode=Mode.PRIVATE)
    with BuildSketch(Plane(origin=(0, 27.049560924, -20.049560924), x_dir=(0, 0, 1), z_dir=(0, -1, 0))) as verrundung1_piece_11b_section:
        with BuildLine():
            CenterArc((VERRUNDUNG1_R, VERRUNDUNG1_R), VERRUNDUNG1_R, 180, 90)
            Line((0, VERRUNDUNG1_R), (-VERRUNDUNG1_R * 0.02, VERRUNDUNG1_R))
            Line((-VERRUNDUNG1_R * 0.02, VERRUNDUNG1_R), (-VERRUNDUNG1_R * 0.02, -VERRUNDUNG1_R * 0.02))
            Line((-VERRUNDUNG1_R * 0.02, -VERRUNDUNG1_R * 0.02), (VERRUNDUNG1_R, -VERRUNDUNG1_R * 0.02))
            Line((VERRUNDUNG1_R, -VERRUNDUNG1_R * 0.02), (VERRUNDUNG1_R, 0))
        make_face()
    verrundung1_piece_11b = extrude(amount=39.311555509, mode=Mode.PRIVATE)
    verrundung1_piece_11b = split(verrundung1_piece_11b, bisect_by=Plane(origin=(-0.132172609, 0.238005415, -16.353891343), z_dir=(0, -1, 0)), keep=Keep.TOP, mode=Mode.PRIVATE)
    verrundung1_piece_11b = split(verrundung1_piece_11b, bisect_by=Plane(origin=(-0.786583865, -12.520560126, -16.353891343), z_dir=(0.2691263412444344, 0.963104881333484, 5.813402738026697e-13)), keep=Keep.TOP, mode=Mode.PRIVATE)
    verrundung1_piece_11b = verrundung1_piece_11b - Plane(origin=(0.609417277, -6.970434083, -16.353891343), x_dir=(0, 1, 0), z_dir=(0, 0, -1)) * Cylinder(2.3, 99, mode=Mode.PRIVATE)
    verrundung1_piece_11 = verrundung1_piece_11a & verrundung1_piece_11b
    add(verrundung1_piece_11)
    with BuildSketch(Plane(origin=(0, 0.238005415, -20.049560924), x_dir=(0, 0, 1), z_dir=(1, 0, 0))) as verrundung1_piece_12a_section:
        with BuildLine():
            CenterArc((VERRUNDUNG1_R, VERRUNDUNG1_R), VERRUNDUNG1_R, 180, 90)
            Line((0, VERRUNDUNG1_R), (-VERRUNDUNG1_R * 0.02, VERRUNDUNG1_R))
            Line((-VERRUNDUNG1_R * 0.02, VERRUNDUNG1_R), (-VERRUNDUNG1_R * 0.02, -VERRUNDUNG1_R * 0.02))
            Line((-VERRUNDUNG1_R * 0.02, -VERRUNDUNG1_R * 0.02), (VERRUNDUNG1_R, -VERRUNDUNG1_R * 0.02))
            Line((VERRUNDUNG1_R, -VERRUNDUNG1_R * 0.02), (VERRUNDUNG1_R, 0))
        make_face()
    verrundung1_piece_12a = extrude(amount=25.506801175, mode=Mode.PRIVATE)
    verrundung1_piece_12a = split(verrundung1_piece_12a, bisect_by=Plane(origin=(13.021336565, 0.290022269, -18.957466714), z_dir=(0.9631048813334842, -0.26912634124443413, -1.6244750072279654e-13)), keep=Keep.TOP, mode=Mode.PRIVATE)
    verrundung1_piece_12a = split(verrundung1_piece_12a, bisect_by=Plane(origin=(21.978663435, 0.290022269, -18.957466714), z_dir=(-0.9631048813334842, -0.2691263412444339, -1.6244750072279647e-13)), keep=Keep.TOP, mode=Mode.PRIVATE)
    with BuildSketch(Plane(origin=(13.006801175, 0.238005415, -27.049560924), x_dir=(1, 0, 0), z_dir=(0, 0, 1))) as verrundung1_piece_12b_section:
        with BuildLine():
            CenterArc((VERRUNDUNG1_R * 0.758872343938, -VERRUNDUNG1_R), VERRUNDUNG1_R, 90, 74.387714312)
            Line((-VERRUNDUNG1_R * 0.204232537396, -VERRUNDUNG1_R * 0.730873658756), (-VERRUNDUNG1_R * 0.223494635022, -VERRUNDUNG1_R * 0.725491131931))
            Line((-VERRUNDUNG1_R * 0.223494635022, -VERRUNDUNG1_R * 0.725491131931), (-VERRUNDUNG1_R * 0.0151774468788, VERRUNDUNG1_R * 0.02))
            Line((-VERRUNDUNG1_R * 0.0151774468788, VERRUNDUNG1_R * 0.02), (VERRUNDUNG1_R * 0.758872343938, VERRUNDUNG1_R * 0.02))
            Line((VERRUNDUNG1_R * 0.758872343938, VERRUNDUNG1_R * 0.02), (VERRUNDUNG1_R * 0.758872343938, 0))
        make_face()
    verrundung1_piece_12b = extrude(amount=16.485904299, mode=Mode.PRIVATE)
    verrundung1_piece_12b = split(verrundung1_piece_12b, bisect_by=Plane(origin=(13.686496075, -2.310633004, -14.188122481), z_dir=(0, 0.6427876096870035, -0.7660444431185887)), keep=Keep.TOP, mode=Mode.PRIVATE)
    verrundung1_piece_12b = split(verrundung1_piece_12b, bisect_by=Plane(origin=(13.686496075, -0.491782993, -20.049560924), z_dir=(0, 0, 1)), keep=Keep.TOP, mode=Mode.PRIVATE)
    verrundung1_piece_12 = verrundung1_piece_12a & verrundung1_piece_12b
    add(verrundung1_piece_12)
    # the kernel refuses this fillet: 5 mm, written as the material it takes off along each edge
    with BuildSketch(Plane(origin=(45.561317912, -9.789145861, -39.549560924), x_dir=(-0.2691263412444356, 0.9631048813334836, 5.813402738026695e-13), z_dir=(0, 0, 1)), Plane(origin=(26.299220285, -15.171672686, -39.549560924), x_dir=(0.9631048813334839, 0.2691263412444345, 1.6244750072279685e-13), z_dir=(0, 0, 1)), Plane(origin=(8.700779715, -15.171672686, -39.549560924), x_dir=(0.2691263412444342, 0.9631048813334839, 5.813402738026696e-13), z_dir=(0, 0, 1)), Plane(origin=(-10.561317912, -9.789145861, -39.549560924), x_dir=(0.9631048813334839, -0.2691263412444345, -1.6244750072279685e-13), z_dir=(0, 0, 1))) as verrundung1_2_piece_1:
        with BuildLine():
            CenterArc((VERRUNDUNG1_R, VERRUNDUNG1_R), VERRUNDUNG1_R, 180, 90)
            Line((0, VERRUNDUNG1_R), (-VERRUNDUNG1_R * 0.02, VERRUNDUNG1_R))
            Line((-VERRUNDUNG1_R * 0.02, VERRUNDUNG1_R), (-VERRUNDUNG1_R * 0.02, -VERRUNDUNG1_R * 0.02))
            Line((-VERRUNDUNG1_R * 0.02, -VERRUNDUNG1_R * 0.02), (VERRUNDUNG1_R, -VERRUNDUNG1_R * 0.02))
            Line((VERRUNDUNG1_R, -VERRUNDUNG1_R * 0.02), (VERRUNDUNG1_R, 0))
        make_face()
    extrude(amount=32, mode=Mode.SUBTRACT)

    # Skizze11 → Schnitt-Linear austragen2 (cut)
    with BuildSketch(Plane.XY.offset(-20.049560924)):
        with Locations((0.609417277, -6.970434083)):
            Circle(SKIZZE11_R)
        with Locations((34.390582723, -6.970434083)):
            Circle(SKIZZE11_R)
    extrude(amount=SCHNITT_LINEAR_AUSTRAGEN2_DEPTH, mode=Mode.SUBTRACT)

    # Skizze12 → Schnitt-Linear austragen3 (cut)
    with BuildSketch(Plane(origin=(0, 0, -27.049560924), x_dir=(-1, 0, 0), z_dir=(0, 0, -1))):
        with Locations(Location((-17.500000004, 21.873797796, 0), (0, 0, 90))):
            Circle(SKIZZE12_R)
    extrude(amount=-SCHNITT_LINEAR_AUSTRAGEN3_DEPTH, mode=Mode.SUBTRACT)


solid = part_1.part
